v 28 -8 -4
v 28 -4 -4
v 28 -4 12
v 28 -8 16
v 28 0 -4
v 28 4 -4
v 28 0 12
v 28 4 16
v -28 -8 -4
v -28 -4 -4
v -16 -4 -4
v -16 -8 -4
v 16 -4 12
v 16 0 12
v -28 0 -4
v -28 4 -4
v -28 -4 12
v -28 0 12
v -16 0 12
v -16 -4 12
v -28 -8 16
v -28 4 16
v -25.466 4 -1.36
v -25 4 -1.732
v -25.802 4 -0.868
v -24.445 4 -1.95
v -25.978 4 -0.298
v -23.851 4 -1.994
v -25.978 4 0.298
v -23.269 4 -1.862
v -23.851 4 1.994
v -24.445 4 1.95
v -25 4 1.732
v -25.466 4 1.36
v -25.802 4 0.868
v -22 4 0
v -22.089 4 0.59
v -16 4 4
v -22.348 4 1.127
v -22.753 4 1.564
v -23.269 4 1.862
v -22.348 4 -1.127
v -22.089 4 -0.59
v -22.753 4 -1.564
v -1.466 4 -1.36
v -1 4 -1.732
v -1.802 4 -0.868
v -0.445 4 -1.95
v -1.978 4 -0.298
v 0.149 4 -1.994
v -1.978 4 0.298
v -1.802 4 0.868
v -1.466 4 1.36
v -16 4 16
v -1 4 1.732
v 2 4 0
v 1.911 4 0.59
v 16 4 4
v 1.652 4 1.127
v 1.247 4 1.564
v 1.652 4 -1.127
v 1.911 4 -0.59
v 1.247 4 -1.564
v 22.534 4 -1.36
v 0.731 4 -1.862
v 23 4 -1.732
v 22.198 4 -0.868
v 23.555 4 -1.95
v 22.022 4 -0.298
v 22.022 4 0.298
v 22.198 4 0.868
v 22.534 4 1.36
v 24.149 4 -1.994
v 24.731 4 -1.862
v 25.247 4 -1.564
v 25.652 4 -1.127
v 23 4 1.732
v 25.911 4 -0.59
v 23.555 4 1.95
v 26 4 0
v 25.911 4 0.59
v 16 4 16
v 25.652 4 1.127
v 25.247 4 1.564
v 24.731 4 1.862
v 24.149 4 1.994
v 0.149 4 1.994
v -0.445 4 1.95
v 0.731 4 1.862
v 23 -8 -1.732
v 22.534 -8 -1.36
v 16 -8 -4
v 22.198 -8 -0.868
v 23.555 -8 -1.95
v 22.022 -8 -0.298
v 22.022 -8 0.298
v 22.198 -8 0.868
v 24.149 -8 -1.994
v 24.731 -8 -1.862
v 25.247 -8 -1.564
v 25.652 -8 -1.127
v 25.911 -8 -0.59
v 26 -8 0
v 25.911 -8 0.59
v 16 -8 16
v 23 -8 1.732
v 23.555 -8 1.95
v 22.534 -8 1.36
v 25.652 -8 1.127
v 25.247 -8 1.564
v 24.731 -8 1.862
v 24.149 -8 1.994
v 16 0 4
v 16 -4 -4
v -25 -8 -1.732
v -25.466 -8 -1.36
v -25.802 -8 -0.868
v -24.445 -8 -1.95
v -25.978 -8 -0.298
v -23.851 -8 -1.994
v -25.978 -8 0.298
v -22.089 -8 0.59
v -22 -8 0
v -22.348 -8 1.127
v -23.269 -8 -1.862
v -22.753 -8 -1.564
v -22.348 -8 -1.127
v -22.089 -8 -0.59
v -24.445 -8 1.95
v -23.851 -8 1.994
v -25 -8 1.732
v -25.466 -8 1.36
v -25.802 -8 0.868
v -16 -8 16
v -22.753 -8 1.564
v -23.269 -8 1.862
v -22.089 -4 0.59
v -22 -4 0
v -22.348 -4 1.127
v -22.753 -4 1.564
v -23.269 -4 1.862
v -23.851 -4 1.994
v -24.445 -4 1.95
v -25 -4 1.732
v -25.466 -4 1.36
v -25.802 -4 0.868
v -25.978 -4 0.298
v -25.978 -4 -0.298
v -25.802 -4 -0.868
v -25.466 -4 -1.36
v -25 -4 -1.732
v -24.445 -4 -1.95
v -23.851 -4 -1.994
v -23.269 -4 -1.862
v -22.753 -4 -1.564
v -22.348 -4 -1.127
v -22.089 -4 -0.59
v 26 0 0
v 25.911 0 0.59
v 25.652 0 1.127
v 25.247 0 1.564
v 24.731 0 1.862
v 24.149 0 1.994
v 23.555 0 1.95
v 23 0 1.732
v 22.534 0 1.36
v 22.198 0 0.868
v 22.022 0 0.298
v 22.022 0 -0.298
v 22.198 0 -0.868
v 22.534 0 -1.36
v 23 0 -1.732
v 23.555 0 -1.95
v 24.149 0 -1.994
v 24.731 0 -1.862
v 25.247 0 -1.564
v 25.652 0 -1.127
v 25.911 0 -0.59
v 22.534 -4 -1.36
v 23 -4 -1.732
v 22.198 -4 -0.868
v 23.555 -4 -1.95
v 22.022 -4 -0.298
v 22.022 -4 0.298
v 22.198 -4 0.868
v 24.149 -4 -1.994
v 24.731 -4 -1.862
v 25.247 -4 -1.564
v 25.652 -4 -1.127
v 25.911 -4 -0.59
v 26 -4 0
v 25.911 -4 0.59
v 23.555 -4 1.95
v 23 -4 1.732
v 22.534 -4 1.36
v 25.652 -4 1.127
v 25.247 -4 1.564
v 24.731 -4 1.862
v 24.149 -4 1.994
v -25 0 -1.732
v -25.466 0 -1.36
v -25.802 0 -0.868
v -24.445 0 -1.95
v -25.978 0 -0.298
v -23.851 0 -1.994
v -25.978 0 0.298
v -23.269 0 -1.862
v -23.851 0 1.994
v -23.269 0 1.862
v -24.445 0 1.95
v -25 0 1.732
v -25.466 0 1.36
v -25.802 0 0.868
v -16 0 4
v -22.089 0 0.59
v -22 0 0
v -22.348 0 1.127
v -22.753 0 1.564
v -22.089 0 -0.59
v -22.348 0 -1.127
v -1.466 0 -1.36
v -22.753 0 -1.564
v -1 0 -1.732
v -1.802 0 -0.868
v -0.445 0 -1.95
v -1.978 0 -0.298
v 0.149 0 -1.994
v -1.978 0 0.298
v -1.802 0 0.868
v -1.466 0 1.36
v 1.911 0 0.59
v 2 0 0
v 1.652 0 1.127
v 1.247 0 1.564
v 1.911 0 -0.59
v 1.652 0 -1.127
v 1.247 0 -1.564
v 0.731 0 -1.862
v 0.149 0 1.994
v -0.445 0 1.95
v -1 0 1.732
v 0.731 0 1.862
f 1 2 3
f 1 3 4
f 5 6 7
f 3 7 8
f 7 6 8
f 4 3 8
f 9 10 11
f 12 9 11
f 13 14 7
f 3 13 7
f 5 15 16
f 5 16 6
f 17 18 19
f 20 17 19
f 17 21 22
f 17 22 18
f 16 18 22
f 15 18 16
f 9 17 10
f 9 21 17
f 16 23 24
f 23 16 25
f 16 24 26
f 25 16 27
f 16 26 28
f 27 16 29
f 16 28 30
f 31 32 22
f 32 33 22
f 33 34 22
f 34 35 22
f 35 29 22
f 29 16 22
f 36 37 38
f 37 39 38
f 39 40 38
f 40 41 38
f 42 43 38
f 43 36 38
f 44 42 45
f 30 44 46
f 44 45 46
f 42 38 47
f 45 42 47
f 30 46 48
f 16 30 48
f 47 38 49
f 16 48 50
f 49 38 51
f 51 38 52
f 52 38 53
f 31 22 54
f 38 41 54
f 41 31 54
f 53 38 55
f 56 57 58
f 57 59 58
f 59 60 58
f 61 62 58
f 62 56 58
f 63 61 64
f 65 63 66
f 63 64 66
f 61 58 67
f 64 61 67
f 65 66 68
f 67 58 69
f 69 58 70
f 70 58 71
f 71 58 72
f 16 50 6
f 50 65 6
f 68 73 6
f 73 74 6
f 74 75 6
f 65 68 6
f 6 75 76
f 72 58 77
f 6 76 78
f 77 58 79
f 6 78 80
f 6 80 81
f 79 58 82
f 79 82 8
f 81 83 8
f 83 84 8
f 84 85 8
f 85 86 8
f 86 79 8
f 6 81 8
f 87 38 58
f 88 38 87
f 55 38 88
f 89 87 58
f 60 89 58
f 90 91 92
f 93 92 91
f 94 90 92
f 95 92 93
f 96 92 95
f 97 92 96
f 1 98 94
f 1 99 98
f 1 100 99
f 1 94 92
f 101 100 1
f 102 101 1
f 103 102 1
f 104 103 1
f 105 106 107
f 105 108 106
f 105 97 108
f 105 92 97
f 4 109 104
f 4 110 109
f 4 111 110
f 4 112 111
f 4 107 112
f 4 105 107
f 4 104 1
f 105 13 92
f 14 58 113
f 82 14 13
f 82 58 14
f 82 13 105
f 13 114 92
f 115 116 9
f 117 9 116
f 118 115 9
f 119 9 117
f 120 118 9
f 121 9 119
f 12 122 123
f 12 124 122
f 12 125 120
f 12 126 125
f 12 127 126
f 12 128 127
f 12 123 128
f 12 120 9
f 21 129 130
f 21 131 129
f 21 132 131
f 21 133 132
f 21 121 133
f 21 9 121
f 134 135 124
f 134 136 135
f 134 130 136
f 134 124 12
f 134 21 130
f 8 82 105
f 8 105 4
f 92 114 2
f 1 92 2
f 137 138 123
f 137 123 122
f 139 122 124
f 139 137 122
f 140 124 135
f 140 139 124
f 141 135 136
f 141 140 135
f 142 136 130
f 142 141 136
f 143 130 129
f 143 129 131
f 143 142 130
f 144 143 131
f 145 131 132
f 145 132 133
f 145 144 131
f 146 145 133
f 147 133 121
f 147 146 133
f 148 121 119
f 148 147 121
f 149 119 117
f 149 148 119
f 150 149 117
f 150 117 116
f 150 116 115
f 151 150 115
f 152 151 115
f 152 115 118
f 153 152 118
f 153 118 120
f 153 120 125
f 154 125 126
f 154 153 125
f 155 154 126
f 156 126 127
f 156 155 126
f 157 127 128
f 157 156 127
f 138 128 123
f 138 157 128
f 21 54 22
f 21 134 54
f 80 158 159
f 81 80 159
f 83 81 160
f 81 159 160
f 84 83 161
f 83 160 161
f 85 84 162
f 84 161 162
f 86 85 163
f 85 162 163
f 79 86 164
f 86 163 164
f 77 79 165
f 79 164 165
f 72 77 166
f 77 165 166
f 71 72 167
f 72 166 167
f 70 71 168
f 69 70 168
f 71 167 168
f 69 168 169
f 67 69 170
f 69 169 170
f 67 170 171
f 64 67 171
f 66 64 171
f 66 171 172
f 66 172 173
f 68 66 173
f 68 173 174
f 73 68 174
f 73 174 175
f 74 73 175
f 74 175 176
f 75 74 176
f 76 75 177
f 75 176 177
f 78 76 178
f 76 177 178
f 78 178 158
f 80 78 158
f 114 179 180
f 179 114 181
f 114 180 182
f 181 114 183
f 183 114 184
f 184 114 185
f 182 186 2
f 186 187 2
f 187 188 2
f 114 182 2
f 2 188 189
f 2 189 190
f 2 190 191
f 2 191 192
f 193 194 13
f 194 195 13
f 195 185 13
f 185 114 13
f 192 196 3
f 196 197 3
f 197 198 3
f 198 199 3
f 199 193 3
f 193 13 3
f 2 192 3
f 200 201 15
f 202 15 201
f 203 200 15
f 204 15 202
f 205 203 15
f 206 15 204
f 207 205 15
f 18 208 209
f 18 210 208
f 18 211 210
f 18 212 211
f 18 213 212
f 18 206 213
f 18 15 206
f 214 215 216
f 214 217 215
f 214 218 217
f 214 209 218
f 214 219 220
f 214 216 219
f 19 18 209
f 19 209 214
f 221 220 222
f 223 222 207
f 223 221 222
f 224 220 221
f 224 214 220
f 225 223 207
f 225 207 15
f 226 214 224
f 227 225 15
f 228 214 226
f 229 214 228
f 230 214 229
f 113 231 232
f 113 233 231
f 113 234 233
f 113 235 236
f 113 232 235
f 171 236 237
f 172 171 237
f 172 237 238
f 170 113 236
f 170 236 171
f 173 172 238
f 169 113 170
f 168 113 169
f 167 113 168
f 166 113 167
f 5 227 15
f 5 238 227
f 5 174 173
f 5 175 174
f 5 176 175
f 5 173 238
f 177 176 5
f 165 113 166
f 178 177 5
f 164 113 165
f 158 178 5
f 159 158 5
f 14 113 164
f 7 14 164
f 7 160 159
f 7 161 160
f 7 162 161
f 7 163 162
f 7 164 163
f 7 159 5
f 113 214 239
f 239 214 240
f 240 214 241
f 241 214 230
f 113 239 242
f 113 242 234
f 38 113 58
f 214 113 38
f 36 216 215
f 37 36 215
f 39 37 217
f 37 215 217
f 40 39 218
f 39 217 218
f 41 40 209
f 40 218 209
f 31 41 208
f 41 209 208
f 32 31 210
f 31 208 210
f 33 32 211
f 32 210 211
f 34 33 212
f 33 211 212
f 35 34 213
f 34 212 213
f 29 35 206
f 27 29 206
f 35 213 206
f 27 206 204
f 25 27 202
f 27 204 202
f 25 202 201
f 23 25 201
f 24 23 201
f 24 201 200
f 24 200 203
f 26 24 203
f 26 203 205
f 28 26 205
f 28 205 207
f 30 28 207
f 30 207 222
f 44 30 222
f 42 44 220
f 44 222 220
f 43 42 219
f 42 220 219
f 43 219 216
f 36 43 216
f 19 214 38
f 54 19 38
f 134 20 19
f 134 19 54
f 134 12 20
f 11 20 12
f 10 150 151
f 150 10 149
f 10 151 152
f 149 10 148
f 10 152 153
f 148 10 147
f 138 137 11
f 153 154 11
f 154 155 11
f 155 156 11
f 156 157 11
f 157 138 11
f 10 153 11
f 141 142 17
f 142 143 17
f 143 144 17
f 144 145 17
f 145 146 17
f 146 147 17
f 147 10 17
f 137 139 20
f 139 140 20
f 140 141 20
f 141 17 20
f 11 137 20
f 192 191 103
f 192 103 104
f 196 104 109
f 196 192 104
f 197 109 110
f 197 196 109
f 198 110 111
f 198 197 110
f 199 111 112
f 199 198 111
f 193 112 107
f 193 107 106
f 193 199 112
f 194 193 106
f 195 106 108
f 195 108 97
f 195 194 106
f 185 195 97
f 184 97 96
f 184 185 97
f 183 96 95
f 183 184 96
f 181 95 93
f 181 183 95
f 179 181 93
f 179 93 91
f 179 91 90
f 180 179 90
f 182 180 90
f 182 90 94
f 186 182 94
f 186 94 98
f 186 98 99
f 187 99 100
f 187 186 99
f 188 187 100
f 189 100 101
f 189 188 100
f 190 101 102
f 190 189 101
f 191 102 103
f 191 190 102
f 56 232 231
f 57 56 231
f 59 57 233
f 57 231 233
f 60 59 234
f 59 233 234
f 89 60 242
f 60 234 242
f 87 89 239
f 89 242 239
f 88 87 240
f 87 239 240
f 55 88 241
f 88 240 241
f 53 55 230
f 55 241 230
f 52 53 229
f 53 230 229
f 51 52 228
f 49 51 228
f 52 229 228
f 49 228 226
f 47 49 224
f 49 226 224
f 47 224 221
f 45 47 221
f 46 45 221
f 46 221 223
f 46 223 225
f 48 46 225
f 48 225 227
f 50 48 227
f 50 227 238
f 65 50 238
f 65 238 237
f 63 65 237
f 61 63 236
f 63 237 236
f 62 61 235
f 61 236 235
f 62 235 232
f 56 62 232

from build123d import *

# Parameters (mm, degrees)
F0_R     = 2
F1_DEPTH = 4
F2_W     = 12
F2_H     = 4
F3_DEPTH = 4
F4_W     = 12
F4_H     = 20
F4_R     = 2
F5_DEPTH = 4


with BuildPart() as f1:
    # F0 (on Front) → F1 (new body)
    with BuildSketch(Plane.XZ):
        Polygon((-28, -4), (28, -4), (28, 4), (28, 16), (16, 16), (16, 4), (-16, 4), (-16, 16), (-28, 16), (-28, 4), align=None)
        with Locations((-24, 0)):
            Circle(F0_R, mode=Mode.SUBTRACT)
        Circle(F0_R, mode=Mode.SUBTRACT)
        with Locations((24, 0)):
            Circle(F0_R, mode=Mode.SUBTRACT)
    extrude(amount=-F1_DEPTH)

    # F2 (on face) → F3 (join)
    with BuildSketch(Plane.XZ):
        with Locations((22, 14)):
            Rectangle(F2_W, F2_H)
        with Locations((-22, 14)):
            Rectangle(F2_W, F2_H)
    extrude(amount=F3_DEPTH)

    # F4 (on face) → F5 (join)
    with BuildSketch(Plane.XZ.offset(4)):
        with Locations((22, 6)):
            Rectangle(F4_W, F4_H)
        with Locations((24, 0)):
            Circle(F4_R, mode=Mode.SUBTRACT)
        with Locations((-22, 6)):
            Rectangle(F4_W, F4_H)
        with Locations((-24, 0)):
            Circle(F4_R, mode=Mode.SUBTRACT)
    extrude(amount=F5_DEPTH)


solid = f1.part
